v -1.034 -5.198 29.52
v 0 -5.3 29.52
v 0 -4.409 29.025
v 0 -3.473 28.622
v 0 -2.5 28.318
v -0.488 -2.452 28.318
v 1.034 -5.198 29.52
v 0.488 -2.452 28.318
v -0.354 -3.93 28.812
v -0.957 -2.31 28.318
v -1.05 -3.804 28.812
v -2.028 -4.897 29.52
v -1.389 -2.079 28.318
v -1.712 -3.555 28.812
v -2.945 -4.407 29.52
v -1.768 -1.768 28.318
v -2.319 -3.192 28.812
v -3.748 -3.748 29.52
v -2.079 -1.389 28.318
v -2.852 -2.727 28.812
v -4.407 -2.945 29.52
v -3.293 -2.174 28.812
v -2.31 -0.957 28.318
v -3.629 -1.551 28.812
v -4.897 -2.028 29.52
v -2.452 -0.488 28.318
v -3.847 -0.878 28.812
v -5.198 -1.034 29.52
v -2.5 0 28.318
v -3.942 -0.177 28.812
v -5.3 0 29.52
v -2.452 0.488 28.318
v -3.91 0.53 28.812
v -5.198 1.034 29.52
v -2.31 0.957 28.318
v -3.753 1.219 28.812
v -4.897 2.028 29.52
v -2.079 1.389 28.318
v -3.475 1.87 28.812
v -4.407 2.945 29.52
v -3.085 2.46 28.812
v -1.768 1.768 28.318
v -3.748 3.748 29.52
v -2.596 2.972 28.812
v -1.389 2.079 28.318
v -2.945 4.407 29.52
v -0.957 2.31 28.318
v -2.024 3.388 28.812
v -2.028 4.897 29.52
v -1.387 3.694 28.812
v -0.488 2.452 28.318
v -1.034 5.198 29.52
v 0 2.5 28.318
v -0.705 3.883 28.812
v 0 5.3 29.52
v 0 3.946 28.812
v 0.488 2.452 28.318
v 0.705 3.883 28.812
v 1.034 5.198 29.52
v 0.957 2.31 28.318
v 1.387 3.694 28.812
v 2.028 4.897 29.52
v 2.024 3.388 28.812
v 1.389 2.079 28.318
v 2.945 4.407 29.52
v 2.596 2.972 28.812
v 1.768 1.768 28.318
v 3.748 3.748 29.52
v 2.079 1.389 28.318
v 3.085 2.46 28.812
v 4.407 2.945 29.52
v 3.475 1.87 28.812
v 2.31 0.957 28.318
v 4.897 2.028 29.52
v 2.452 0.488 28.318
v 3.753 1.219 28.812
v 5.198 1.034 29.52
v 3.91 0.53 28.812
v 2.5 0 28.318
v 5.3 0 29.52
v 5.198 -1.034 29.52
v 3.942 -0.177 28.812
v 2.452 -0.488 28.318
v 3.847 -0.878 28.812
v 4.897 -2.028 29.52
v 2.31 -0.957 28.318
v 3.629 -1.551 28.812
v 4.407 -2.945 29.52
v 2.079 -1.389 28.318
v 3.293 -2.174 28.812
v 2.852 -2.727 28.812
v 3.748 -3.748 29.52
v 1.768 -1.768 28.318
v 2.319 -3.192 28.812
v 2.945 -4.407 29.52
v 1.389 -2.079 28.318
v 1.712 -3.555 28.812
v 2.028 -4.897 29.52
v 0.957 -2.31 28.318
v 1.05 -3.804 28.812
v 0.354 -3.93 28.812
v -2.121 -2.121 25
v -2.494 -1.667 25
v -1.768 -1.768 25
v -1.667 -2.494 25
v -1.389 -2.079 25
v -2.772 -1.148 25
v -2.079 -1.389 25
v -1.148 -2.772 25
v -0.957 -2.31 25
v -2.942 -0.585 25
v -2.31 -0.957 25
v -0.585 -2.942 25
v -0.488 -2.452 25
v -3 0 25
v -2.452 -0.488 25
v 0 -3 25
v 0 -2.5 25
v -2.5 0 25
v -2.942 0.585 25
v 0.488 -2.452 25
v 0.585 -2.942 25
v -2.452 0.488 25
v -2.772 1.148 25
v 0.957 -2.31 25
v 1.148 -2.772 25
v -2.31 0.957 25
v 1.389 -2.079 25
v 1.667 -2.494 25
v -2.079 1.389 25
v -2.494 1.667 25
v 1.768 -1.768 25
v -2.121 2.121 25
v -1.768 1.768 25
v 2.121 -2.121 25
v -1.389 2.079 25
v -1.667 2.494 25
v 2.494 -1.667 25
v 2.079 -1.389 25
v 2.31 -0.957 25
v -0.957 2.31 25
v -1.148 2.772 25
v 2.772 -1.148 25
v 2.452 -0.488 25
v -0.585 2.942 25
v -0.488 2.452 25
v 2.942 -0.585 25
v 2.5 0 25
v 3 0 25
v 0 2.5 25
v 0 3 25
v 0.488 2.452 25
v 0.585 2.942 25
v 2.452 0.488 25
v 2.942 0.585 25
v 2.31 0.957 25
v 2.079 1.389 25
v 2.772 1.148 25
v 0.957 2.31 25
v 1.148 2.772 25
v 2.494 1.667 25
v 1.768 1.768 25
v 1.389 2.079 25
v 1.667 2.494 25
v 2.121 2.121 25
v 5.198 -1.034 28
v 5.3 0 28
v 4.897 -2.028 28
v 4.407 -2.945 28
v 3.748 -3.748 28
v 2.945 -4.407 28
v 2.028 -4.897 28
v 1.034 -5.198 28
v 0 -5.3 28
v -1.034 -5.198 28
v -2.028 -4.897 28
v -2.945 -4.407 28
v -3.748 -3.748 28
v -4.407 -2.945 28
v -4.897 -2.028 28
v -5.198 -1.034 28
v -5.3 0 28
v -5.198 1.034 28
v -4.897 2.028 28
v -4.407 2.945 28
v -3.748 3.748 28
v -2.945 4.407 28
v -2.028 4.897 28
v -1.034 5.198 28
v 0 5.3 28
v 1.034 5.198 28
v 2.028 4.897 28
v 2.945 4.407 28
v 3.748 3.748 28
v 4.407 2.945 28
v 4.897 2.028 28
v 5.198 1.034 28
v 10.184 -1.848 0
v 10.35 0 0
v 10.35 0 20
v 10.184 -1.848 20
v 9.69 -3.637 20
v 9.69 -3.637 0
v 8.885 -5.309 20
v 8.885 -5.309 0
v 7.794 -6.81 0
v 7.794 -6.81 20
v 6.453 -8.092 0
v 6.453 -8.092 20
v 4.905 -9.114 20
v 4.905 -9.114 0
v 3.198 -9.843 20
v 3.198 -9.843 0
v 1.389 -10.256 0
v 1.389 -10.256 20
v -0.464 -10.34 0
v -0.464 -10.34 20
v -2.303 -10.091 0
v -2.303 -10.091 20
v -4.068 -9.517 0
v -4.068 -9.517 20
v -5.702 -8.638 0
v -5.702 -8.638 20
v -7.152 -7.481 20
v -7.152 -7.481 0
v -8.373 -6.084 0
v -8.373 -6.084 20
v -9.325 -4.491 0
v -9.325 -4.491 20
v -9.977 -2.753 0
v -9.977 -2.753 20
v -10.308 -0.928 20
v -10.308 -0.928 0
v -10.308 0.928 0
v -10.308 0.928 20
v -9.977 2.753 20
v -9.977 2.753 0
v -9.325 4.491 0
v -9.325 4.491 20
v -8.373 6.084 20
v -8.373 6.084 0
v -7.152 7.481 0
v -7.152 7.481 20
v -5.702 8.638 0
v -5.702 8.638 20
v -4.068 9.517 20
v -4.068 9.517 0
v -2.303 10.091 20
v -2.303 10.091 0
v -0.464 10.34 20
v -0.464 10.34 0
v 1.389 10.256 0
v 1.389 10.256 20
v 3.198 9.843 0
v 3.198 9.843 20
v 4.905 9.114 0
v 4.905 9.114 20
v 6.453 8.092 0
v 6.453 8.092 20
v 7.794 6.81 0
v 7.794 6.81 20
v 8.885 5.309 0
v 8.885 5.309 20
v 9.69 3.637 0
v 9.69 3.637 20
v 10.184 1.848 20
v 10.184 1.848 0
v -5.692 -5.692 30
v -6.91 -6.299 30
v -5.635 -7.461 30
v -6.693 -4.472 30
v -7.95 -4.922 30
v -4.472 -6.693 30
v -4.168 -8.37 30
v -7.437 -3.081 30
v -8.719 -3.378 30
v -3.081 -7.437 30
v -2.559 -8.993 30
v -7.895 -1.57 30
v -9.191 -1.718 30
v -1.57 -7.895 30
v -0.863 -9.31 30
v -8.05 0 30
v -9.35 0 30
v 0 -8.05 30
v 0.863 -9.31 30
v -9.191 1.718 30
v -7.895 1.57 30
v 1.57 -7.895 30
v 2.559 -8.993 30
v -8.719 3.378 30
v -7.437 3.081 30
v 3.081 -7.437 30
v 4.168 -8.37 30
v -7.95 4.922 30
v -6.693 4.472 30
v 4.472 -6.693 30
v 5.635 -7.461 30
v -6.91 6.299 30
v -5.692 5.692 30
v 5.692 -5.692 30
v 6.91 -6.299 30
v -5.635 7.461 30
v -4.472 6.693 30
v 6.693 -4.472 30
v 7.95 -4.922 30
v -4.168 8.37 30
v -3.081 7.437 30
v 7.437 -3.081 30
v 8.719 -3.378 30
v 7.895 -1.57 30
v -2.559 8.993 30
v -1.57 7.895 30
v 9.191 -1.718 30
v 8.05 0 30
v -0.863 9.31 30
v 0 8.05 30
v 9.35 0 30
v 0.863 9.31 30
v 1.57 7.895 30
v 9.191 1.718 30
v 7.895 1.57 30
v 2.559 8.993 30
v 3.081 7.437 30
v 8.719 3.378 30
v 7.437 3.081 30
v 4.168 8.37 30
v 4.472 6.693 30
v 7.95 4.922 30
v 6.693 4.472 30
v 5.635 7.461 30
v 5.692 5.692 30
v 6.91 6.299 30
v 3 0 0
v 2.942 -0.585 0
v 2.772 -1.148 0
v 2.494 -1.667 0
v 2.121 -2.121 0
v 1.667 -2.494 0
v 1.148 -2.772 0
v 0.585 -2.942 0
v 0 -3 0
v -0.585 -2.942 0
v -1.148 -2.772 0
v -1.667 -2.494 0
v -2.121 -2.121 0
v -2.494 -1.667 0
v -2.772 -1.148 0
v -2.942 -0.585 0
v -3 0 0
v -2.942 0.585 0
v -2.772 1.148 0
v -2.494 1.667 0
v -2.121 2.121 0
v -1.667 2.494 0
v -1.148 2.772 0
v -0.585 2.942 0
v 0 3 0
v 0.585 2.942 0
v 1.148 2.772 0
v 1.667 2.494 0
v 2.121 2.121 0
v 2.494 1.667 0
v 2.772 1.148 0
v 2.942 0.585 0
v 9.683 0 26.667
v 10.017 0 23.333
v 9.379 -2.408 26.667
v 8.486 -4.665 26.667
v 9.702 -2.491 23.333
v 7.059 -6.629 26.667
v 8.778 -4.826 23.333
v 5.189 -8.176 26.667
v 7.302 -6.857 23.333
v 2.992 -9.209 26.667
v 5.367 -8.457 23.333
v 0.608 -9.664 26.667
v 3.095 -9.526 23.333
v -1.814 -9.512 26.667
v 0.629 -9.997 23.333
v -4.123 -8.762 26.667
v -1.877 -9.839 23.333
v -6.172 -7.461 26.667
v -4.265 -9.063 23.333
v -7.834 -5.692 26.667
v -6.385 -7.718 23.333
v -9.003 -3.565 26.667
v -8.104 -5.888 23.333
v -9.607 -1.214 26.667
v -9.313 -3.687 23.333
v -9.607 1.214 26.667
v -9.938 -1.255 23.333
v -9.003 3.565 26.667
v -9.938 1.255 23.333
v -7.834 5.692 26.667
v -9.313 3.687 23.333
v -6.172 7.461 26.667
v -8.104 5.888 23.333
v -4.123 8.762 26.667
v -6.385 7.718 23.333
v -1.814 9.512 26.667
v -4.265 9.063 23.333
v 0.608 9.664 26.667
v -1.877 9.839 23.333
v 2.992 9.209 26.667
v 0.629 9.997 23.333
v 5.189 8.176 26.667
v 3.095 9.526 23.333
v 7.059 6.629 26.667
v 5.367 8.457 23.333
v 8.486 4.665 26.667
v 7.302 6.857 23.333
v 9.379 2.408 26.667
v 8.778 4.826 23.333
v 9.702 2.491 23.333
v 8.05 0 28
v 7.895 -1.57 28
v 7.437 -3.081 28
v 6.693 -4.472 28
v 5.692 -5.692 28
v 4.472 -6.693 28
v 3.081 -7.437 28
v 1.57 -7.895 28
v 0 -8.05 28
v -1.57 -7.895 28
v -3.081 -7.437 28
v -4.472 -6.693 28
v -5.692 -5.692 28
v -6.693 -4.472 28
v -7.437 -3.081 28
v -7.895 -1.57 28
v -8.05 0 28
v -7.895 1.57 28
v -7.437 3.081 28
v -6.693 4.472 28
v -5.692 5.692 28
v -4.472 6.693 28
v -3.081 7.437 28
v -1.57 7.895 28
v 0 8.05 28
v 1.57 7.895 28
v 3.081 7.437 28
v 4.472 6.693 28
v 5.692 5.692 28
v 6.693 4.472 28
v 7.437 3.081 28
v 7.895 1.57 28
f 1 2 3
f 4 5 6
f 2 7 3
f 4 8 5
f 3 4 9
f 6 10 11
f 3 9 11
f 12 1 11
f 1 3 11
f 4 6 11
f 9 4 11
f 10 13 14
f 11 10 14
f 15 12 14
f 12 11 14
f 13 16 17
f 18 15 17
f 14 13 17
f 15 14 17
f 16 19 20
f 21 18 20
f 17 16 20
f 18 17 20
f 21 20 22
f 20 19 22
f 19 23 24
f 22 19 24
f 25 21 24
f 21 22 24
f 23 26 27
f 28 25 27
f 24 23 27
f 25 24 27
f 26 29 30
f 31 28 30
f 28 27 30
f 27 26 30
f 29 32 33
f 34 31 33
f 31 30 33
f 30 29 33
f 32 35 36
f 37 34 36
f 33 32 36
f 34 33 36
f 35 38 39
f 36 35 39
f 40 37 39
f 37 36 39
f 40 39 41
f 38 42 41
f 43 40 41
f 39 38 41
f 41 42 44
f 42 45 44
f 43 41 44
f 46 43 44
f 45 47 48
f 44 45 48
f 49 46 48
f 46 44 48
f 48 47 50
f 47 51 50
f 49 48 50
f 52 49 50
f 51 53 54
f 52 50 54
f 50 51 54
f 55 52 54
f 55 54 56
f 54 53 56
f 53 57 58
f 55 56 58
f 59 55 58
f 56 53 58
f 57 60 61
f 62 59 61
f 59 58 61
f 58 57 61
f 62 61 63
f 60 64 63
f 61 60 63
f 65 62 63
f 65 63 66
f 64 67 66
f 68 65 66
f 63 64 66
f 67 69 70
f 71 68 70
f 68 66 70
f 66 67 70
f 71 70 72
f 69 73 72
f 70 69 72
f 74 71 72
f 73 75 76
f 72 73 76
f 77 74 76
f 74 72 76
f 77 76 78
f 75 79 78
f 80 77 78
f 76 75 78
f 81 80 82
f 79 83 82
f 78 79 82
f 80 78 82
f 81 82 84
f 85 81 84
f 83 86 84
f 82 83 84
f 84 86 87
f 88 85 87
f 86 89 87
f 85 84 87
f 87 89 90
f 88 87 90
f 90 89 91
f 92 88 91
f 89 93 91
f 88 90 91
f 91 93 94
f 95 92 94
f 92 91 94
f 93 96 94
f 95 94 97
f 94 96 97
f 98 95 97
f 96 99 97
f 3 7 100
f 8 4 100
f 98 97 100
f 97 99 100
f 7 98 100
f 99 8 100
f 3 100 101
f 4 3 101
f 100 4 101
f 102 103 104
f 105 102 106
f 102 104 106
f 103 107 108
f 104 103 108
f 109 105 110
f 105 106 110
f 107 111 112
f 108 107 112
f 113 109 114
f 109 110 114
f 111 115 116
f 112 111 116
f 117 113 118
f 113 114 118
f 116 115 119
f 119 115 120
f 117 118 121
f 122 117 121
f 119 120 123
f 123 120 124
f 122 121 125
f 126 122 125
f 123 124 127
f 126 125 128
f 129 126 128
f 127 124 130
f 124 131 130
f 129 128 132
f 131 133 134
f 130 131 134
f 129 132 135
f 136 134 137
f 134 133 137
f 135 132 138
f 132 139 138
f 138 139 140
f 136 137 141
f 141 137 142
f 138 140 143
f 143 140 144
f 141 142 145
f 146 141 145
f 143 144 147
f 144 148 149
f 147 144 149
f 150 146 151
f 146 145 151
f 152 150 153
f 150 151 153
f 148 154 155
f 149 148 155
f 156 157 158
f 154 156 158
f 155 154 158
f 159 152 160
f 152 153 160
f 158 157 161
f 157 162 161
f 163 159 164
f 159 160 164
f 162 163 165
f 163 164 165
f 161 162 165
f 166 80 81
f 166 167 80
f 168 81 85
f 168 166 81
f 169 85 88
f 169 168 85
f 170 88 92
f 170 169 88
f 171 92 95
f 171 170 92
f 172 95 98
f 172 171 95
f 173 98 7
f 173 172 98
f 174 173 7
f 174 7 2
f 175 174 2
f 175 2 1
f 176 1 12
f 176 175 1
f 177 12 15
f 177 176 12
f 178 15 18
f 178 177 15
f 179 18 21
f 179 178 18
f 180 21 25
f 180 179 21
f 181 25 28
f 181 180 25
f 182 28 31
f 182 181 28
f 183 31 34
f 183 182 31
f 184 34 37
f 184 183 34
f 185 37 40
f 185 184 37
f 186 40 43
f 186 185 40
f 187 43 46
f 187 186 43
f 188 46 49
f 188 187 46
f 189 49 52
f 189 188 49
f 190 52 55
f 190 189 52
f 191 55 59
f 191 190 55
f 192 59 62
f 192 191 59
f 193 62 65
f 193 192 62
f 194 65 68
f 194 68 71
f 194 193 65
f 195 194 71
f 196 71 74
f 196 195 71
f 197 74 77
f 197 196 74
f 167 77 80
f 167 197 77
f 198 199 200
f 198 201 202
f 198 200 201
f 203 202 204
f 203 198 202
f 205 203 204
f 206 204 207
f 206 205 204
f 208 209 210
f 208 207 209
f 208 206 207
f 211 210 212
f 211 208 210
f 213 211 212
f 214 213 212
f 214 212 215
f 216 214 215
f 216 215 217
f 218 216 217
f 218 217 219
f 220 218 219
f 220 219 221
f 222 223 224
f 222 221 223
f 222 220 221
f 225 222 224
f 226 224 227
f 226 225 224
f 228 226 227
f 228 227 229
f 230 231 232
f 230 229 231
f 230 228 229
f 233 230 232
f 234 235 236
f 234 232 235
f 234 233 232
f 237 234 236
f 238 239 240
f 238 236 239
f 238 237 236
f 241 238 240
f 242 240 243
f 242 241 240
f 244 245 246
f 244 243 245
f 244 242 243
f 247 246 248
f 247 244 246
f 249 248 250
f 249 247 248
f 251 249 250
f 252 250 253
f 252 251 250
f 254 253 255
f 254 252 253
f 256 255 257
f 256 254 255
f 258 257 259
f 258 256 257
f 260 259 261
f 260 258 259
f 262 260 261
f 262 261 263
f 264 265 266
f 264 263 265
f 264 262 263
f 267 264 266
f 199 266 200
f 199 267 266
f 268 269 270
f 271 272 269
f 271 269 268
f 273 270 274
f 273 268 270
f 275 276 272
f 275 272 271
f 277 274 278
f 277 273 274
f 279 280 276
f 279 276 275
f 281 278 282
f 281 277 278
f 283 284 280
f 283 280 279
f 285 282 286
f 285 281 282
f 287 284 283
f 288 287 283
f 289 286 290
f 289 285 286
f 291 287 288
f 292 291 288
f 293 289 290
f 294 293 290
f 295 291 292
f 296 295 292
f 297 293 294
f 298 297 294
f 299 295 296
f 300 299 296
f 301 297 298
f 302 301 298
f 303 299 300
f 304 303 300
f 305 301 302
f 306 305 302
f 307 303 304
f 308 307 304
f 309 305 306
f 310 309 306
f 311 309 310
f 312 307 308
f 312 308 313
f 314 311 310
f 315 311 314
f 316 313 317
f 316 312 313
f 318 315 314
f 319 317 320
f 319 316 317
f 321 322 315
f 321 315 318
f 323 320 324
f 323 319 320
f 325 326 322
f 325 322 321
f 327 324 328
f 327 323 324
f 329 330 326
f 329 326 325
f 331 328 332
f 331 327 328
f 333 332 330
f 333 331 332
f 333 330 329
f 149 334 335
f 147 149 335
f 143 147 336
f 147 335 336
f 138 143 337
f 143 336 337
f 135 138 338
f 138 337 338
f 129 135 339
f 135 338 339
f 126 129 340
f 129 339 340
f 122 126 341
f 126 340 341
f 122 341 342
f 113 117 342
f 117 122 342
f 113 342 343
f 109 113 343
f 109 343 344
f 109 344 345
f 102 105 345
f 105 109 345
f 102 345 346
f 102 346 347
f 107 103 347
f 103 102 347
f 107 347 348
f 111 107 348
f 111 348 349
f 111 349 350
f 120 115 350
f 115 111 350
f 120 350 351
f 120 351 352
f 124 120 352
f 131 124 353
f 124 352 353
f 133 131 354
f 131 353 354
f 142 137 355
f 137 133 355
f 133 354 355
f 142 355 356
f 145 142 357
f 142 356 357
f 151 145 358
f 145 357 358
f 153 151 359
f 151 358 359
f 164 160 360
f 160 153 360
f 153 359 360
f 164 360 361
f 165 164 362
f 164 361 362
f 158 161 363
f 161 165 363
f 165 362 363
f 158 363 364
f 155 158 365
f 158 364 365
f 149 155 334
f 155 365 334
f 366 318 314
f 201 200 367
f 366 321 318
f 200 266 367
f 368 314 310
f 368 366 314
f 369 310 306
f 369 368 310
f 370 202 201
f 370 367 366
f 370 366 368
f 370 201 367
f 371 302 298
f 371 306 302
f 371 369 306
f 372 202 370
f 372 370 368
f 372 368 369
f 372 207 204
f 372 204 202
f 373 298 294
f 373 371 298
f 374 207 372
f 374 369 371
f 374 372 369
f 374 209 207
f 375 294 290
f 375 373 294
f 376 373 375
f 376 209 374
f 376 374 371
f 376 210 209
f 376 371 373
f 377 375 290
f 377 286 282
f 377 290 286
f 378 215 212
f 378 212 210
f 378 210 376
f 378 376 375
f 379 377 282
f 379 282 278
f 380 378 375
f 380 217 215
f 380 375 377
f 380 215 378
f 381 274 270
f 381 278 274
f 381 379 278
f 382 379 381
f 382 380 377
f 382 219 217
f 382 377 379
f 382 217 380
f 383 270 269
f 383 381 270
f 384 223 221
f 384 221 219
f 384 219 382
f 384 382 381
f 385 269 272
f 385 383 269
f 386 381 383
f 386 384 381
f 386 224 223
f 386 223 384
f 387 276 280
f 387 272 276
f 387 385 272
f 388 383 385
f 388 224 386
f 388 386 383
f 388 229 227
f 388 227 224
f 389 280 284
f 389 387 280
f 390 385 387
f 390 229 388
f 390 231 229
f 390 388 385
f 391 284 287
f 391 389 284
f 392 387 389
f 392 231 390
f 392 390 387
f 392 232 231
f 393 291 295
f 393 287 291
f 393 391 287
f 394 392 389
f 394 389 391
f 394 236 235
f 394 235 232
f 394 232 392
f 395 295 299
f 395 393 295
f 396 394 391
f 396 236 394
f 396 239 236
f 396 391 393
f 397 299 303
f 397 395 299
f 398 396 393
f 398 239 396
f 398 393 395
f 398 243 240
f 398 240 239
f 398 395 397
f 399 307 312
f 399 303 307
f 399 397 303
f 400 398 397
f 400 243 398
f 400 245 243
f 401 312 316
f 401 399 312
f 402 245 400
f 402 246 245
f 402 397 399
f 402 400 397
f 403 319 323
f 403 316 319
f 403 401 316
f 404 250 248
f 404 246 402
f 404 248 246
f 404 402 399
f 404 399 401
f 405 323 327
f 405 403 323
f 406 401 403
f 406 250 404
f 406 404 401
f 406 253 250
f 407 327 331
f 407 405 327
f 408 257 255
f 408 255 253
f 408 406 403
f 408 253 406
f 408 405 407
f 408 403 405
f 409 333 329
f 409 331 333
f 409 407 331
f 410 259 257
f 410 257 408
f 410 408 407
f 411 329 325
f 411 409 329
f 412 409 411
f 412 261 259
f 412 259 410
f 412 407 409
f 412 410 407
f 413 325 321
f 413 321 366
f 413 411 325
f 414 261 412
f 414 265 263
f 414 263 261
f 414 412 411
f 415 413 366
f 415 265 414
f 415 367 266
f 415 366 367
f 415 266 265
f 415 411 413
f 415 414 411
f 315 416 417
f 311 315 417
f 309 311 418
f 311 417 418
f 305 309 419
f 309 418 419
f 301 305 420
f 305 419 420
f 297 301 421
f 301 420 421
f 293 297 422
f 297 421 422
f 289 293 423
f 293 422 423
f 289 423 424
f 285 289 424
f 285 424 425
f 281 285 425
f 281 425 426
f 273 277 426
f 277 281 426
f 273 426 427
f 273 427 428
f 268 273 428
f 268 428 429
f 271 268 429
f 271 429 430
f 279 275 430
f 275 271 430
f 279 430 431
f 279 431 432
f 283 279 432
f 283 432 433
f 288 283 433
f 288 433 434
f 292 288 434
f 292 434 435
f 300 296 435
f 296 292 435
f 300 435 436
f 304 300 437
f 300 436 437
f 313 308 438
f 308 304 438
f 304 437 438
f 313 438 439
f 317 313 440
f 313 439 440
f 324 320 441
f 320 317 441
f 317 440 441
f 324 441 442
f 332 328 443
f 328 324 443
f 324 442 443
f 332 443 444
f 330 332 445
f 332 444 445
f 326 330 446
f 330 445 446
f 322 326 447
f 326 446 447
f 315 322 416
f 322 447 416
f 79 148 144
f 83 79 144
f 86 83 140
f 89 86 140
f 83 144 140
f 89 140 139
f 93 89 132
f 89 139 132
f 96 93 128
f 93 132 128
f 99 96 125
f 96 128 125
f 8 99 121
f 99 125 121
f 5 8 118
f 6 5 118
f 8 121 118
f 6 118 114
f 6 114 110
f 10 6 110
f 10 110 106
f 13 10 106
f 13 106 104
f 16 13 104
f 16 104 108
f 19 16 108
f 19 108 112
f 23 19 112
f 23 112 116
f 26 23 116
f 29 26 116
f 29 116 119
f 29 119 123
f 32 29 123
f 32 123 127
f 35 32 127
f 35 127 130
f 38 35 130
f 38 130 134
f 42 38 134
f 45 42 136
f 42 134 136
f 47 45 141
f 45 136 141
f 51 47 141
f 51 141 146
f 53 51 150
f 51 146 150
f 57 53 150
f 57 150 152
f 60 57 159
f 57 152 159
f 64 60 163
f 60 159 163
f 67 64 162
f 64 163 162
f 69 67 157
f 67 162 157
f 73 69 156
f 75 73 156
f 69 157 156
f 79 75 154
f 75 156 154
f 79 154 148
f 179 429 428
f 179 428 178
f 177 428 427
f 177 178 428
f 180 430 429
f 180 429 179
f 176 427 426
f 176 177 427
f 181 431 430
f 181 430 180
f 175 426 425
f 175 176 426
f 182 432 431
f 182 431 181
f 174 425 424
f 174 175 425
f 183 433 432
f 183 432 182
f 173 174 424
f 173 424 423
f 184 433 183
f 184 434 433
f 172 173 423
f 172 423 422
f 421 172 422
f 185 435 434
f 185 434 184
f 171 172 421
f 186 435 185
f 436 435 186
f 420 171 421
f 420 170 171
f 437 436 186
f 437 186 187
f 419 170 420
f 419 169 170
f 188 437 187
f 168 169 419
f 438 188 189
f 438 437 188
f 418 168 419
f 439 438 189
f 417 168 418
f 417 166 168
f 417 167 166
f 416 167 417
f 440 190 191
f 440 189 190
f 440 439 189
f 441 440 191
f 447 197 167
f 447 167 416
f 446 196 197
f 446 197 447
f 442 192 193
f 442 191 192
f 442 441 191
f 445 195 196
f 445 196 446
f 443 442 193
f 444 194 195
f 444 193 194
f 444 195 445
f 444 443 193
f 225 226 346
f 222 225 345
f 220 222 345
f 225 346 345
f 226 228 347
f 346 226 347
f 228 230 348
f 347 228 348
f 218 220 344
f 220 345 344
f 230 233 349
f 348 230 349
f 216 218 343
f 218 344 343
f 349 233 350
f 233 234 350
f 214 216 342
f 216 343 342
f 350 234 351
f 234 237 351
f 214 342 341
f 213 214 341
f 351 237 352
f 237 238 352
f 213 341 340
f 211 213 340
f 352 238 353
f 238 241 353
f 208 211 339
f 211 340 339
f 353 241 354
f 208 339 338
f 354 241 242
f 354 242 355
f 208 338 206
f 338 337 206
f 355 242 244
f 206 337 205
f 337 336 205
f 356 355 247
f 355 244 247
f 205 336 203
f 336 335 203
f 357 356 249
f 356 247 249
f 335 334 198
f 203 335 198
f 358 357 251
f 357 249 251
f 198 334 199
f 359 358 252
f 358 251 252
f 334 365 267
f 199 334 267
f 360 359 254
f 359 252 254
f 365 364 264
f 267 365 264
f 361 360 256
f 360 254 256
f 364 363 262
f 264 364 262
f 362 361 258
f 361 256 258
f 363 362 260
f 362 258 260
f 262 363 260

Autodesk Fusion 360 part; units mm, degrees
sketch "Sketch1" plane through (0, 0, 0) normal (0, 0, 1) x (1, 0, 0)
  circle A0 centre (0, 0) radius 5.3
  circle A1 centre (0, 0) radius 8.05
  circle A2 centre (0, 0) radius 10.35
  circle A3 centre (0, 0) radius 2.5
  circle A4 centre (0, 0) radius 3
  dimension "d1" = 10.6
  dimension "d2" = 16.1
  dimension "d3" = 20.7
  dimension "d8" = 5
  dimension "d9" = 6
extrude "Extrude1" add sketch "Sketch1" along normal blind 30 contours A0 | A2 | A4 makes body 1 at (10.2986, -1.0305, 20) makes body 2 at (5.2737, -0.5277, 20)
extrude "Extrude2" add sketch "Sketch1" along normal blind 28 contours A1 bodies 1 2
extrude "Extrude3" cut sketch "Sketch1" along normal blind 25 contours A3 | A4 bodies 1
chamfer "Chamfer1" distance 1 distance2 10 1 edges at (-9.6496, -3.7427, 30) measured on face at (9.5148, -0.9141, 30) on bodies 1
sketch "Sketch2" plane through (0, 0, 0) normal (1, 0, 0) x (0, 0, -1)
  arc A0 (-38, -10) -> (-28, 0) centre (-38, 0) ccw
  line L0 (-28, 0) -> (-38, 0)
  line L1 (-38, 0) -> (-38, -10)
  line L2 (-1.75, 0) -> (-22.5, 0)
  dimension "d14" = 10
  dimension "d15" = 38
revolve "Revolve1" cut sketch "Sketch2" angle 360 about axis through (0, 0, 28) along (0, 0, 1) bodies 1
equation "d8 = draadstang - 2 * draadstangtolerance"
equation "d9 = draadstang"
equation "draadstang = 6 mm"
equation "draadstangtolerance = 0.5 mm"
